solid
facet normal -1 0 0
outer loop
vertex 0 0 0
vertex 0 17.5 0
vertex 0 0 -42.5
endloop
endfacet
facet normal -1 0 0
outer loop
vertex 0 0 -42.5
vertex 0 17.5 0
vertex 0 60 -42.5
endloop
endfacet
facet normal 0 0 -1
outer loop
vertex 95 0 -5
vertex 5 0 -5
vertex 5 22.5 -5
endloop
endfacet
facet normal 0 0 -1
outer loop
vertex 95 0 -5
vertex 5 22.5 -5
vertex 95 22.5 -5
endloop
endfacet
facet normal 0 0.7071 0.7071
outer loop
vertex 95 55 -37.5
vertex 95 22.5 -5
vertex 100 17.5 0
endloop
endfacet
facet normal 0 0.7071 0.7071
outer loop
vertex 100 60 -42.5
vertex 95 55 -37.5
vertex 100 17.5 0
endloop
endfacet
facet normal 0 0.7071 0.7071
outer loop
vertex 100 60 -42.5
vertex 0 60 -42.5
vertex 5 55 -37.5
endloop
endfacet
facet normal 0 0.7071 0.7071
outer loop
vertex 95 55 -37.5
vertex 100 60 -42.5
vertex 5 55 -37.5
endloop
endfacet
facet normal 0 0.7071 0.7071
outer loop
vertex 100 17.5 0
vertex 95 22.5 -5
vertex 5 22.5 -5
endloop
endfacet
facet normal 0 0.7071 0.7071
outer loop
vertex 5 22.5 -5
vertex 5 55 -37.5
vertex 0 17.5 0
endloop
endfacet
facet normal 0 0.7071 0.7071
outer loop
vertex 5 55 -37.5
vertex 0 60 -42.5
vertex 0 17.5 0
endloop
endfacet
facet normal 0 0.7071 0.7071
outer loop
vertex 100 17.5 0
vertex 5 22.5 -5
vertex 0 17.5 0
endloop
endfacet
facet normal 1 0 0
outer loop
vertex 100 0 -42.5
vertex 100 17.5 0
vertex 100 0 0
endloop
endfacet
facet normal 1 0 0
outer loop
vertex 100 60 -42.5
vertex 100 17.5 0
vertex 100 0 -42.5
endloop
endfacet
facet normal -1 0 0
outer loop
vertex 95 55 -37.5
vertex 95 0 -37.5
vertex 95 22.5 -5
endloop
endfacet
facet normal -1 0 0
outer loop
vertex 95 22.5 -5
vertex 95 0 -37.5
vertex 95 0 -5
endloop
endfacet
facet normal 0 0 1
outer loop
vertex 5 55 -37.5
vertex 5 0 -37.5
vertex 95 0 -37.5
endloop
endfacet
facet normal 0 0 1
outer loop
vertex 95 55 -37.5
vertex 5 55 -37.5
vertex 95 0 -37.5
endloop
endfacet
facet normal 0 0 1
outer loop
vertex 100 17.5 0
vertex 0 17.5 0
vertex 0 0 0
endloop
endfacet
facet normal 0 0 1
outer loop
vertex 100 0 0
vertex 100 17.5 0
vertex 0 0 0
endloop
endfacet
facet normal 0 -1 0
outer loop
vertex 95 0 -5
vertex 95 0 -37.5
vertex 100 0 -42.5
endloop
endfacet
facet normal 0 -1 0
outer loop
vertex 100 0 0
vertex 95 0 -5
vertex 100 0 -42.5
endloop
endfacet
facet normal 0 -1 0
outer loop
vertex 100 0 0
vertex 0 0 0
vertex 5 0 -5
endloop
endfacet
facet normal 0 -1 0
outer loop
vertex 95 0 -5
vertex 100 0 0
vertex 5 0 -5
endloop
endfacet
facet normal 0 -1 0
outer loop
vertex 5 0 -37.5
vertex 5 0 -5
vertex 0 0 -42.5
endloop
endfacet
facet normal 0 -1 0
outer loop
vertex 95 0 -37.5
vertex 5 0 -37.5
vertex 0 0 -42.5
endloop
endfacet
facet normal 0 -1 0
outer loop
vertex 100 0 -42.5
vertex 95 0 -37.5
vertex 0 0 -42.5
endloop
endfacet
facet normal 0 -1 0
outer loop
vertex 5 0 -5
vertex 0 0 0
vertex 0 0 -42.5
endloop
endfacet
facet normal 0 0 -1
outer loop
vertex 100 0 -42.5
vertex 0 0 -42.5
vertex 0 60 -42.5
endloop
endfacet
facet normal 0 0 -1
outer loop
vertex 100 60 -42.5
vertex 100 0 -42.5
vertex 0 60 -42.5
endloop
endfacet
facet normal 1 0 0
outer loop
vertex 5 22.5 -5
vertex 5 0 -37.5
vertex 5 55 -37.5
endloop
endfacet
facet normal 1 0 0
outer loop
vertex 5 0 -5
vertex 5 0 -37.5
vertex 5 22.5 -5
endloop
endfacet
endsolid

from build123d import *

# Parameters (mm, degrees)
BOSS_EXTRUDE2_DEPTH = 100
SKETCH3_W           = 90
SKETCH3_H           = 32.5
CUT_EXTRUDE1_DEPTH  = 60


with BuildPart() as part:
    # Sketch2 → Boss-Extrude2 (new body)
    with BuildSketch(Plane(origin=(0, 0, 0), x_dir=(0, 0, -1), z_dir=(1, 0, 0))):
        Polygon((42.5, 60), (0, 17.5), (0, 0), (42.5, 0), align=None)
    extrude(amount=BOSS_EXTRUDE2_DEPTH)

    # Sketch3 → Cut-Extrude1 (cut)
    with BuildSketch(Plane.XZ):
        with Locations((50, -21.25)):
            Rectangle(SKETCH3_W, SKETCH3_H)
    extrude(amount=-CUT_EXTRUDE1_DEPTH, mode=Mode.SUBTRACT)


solid = part.part
